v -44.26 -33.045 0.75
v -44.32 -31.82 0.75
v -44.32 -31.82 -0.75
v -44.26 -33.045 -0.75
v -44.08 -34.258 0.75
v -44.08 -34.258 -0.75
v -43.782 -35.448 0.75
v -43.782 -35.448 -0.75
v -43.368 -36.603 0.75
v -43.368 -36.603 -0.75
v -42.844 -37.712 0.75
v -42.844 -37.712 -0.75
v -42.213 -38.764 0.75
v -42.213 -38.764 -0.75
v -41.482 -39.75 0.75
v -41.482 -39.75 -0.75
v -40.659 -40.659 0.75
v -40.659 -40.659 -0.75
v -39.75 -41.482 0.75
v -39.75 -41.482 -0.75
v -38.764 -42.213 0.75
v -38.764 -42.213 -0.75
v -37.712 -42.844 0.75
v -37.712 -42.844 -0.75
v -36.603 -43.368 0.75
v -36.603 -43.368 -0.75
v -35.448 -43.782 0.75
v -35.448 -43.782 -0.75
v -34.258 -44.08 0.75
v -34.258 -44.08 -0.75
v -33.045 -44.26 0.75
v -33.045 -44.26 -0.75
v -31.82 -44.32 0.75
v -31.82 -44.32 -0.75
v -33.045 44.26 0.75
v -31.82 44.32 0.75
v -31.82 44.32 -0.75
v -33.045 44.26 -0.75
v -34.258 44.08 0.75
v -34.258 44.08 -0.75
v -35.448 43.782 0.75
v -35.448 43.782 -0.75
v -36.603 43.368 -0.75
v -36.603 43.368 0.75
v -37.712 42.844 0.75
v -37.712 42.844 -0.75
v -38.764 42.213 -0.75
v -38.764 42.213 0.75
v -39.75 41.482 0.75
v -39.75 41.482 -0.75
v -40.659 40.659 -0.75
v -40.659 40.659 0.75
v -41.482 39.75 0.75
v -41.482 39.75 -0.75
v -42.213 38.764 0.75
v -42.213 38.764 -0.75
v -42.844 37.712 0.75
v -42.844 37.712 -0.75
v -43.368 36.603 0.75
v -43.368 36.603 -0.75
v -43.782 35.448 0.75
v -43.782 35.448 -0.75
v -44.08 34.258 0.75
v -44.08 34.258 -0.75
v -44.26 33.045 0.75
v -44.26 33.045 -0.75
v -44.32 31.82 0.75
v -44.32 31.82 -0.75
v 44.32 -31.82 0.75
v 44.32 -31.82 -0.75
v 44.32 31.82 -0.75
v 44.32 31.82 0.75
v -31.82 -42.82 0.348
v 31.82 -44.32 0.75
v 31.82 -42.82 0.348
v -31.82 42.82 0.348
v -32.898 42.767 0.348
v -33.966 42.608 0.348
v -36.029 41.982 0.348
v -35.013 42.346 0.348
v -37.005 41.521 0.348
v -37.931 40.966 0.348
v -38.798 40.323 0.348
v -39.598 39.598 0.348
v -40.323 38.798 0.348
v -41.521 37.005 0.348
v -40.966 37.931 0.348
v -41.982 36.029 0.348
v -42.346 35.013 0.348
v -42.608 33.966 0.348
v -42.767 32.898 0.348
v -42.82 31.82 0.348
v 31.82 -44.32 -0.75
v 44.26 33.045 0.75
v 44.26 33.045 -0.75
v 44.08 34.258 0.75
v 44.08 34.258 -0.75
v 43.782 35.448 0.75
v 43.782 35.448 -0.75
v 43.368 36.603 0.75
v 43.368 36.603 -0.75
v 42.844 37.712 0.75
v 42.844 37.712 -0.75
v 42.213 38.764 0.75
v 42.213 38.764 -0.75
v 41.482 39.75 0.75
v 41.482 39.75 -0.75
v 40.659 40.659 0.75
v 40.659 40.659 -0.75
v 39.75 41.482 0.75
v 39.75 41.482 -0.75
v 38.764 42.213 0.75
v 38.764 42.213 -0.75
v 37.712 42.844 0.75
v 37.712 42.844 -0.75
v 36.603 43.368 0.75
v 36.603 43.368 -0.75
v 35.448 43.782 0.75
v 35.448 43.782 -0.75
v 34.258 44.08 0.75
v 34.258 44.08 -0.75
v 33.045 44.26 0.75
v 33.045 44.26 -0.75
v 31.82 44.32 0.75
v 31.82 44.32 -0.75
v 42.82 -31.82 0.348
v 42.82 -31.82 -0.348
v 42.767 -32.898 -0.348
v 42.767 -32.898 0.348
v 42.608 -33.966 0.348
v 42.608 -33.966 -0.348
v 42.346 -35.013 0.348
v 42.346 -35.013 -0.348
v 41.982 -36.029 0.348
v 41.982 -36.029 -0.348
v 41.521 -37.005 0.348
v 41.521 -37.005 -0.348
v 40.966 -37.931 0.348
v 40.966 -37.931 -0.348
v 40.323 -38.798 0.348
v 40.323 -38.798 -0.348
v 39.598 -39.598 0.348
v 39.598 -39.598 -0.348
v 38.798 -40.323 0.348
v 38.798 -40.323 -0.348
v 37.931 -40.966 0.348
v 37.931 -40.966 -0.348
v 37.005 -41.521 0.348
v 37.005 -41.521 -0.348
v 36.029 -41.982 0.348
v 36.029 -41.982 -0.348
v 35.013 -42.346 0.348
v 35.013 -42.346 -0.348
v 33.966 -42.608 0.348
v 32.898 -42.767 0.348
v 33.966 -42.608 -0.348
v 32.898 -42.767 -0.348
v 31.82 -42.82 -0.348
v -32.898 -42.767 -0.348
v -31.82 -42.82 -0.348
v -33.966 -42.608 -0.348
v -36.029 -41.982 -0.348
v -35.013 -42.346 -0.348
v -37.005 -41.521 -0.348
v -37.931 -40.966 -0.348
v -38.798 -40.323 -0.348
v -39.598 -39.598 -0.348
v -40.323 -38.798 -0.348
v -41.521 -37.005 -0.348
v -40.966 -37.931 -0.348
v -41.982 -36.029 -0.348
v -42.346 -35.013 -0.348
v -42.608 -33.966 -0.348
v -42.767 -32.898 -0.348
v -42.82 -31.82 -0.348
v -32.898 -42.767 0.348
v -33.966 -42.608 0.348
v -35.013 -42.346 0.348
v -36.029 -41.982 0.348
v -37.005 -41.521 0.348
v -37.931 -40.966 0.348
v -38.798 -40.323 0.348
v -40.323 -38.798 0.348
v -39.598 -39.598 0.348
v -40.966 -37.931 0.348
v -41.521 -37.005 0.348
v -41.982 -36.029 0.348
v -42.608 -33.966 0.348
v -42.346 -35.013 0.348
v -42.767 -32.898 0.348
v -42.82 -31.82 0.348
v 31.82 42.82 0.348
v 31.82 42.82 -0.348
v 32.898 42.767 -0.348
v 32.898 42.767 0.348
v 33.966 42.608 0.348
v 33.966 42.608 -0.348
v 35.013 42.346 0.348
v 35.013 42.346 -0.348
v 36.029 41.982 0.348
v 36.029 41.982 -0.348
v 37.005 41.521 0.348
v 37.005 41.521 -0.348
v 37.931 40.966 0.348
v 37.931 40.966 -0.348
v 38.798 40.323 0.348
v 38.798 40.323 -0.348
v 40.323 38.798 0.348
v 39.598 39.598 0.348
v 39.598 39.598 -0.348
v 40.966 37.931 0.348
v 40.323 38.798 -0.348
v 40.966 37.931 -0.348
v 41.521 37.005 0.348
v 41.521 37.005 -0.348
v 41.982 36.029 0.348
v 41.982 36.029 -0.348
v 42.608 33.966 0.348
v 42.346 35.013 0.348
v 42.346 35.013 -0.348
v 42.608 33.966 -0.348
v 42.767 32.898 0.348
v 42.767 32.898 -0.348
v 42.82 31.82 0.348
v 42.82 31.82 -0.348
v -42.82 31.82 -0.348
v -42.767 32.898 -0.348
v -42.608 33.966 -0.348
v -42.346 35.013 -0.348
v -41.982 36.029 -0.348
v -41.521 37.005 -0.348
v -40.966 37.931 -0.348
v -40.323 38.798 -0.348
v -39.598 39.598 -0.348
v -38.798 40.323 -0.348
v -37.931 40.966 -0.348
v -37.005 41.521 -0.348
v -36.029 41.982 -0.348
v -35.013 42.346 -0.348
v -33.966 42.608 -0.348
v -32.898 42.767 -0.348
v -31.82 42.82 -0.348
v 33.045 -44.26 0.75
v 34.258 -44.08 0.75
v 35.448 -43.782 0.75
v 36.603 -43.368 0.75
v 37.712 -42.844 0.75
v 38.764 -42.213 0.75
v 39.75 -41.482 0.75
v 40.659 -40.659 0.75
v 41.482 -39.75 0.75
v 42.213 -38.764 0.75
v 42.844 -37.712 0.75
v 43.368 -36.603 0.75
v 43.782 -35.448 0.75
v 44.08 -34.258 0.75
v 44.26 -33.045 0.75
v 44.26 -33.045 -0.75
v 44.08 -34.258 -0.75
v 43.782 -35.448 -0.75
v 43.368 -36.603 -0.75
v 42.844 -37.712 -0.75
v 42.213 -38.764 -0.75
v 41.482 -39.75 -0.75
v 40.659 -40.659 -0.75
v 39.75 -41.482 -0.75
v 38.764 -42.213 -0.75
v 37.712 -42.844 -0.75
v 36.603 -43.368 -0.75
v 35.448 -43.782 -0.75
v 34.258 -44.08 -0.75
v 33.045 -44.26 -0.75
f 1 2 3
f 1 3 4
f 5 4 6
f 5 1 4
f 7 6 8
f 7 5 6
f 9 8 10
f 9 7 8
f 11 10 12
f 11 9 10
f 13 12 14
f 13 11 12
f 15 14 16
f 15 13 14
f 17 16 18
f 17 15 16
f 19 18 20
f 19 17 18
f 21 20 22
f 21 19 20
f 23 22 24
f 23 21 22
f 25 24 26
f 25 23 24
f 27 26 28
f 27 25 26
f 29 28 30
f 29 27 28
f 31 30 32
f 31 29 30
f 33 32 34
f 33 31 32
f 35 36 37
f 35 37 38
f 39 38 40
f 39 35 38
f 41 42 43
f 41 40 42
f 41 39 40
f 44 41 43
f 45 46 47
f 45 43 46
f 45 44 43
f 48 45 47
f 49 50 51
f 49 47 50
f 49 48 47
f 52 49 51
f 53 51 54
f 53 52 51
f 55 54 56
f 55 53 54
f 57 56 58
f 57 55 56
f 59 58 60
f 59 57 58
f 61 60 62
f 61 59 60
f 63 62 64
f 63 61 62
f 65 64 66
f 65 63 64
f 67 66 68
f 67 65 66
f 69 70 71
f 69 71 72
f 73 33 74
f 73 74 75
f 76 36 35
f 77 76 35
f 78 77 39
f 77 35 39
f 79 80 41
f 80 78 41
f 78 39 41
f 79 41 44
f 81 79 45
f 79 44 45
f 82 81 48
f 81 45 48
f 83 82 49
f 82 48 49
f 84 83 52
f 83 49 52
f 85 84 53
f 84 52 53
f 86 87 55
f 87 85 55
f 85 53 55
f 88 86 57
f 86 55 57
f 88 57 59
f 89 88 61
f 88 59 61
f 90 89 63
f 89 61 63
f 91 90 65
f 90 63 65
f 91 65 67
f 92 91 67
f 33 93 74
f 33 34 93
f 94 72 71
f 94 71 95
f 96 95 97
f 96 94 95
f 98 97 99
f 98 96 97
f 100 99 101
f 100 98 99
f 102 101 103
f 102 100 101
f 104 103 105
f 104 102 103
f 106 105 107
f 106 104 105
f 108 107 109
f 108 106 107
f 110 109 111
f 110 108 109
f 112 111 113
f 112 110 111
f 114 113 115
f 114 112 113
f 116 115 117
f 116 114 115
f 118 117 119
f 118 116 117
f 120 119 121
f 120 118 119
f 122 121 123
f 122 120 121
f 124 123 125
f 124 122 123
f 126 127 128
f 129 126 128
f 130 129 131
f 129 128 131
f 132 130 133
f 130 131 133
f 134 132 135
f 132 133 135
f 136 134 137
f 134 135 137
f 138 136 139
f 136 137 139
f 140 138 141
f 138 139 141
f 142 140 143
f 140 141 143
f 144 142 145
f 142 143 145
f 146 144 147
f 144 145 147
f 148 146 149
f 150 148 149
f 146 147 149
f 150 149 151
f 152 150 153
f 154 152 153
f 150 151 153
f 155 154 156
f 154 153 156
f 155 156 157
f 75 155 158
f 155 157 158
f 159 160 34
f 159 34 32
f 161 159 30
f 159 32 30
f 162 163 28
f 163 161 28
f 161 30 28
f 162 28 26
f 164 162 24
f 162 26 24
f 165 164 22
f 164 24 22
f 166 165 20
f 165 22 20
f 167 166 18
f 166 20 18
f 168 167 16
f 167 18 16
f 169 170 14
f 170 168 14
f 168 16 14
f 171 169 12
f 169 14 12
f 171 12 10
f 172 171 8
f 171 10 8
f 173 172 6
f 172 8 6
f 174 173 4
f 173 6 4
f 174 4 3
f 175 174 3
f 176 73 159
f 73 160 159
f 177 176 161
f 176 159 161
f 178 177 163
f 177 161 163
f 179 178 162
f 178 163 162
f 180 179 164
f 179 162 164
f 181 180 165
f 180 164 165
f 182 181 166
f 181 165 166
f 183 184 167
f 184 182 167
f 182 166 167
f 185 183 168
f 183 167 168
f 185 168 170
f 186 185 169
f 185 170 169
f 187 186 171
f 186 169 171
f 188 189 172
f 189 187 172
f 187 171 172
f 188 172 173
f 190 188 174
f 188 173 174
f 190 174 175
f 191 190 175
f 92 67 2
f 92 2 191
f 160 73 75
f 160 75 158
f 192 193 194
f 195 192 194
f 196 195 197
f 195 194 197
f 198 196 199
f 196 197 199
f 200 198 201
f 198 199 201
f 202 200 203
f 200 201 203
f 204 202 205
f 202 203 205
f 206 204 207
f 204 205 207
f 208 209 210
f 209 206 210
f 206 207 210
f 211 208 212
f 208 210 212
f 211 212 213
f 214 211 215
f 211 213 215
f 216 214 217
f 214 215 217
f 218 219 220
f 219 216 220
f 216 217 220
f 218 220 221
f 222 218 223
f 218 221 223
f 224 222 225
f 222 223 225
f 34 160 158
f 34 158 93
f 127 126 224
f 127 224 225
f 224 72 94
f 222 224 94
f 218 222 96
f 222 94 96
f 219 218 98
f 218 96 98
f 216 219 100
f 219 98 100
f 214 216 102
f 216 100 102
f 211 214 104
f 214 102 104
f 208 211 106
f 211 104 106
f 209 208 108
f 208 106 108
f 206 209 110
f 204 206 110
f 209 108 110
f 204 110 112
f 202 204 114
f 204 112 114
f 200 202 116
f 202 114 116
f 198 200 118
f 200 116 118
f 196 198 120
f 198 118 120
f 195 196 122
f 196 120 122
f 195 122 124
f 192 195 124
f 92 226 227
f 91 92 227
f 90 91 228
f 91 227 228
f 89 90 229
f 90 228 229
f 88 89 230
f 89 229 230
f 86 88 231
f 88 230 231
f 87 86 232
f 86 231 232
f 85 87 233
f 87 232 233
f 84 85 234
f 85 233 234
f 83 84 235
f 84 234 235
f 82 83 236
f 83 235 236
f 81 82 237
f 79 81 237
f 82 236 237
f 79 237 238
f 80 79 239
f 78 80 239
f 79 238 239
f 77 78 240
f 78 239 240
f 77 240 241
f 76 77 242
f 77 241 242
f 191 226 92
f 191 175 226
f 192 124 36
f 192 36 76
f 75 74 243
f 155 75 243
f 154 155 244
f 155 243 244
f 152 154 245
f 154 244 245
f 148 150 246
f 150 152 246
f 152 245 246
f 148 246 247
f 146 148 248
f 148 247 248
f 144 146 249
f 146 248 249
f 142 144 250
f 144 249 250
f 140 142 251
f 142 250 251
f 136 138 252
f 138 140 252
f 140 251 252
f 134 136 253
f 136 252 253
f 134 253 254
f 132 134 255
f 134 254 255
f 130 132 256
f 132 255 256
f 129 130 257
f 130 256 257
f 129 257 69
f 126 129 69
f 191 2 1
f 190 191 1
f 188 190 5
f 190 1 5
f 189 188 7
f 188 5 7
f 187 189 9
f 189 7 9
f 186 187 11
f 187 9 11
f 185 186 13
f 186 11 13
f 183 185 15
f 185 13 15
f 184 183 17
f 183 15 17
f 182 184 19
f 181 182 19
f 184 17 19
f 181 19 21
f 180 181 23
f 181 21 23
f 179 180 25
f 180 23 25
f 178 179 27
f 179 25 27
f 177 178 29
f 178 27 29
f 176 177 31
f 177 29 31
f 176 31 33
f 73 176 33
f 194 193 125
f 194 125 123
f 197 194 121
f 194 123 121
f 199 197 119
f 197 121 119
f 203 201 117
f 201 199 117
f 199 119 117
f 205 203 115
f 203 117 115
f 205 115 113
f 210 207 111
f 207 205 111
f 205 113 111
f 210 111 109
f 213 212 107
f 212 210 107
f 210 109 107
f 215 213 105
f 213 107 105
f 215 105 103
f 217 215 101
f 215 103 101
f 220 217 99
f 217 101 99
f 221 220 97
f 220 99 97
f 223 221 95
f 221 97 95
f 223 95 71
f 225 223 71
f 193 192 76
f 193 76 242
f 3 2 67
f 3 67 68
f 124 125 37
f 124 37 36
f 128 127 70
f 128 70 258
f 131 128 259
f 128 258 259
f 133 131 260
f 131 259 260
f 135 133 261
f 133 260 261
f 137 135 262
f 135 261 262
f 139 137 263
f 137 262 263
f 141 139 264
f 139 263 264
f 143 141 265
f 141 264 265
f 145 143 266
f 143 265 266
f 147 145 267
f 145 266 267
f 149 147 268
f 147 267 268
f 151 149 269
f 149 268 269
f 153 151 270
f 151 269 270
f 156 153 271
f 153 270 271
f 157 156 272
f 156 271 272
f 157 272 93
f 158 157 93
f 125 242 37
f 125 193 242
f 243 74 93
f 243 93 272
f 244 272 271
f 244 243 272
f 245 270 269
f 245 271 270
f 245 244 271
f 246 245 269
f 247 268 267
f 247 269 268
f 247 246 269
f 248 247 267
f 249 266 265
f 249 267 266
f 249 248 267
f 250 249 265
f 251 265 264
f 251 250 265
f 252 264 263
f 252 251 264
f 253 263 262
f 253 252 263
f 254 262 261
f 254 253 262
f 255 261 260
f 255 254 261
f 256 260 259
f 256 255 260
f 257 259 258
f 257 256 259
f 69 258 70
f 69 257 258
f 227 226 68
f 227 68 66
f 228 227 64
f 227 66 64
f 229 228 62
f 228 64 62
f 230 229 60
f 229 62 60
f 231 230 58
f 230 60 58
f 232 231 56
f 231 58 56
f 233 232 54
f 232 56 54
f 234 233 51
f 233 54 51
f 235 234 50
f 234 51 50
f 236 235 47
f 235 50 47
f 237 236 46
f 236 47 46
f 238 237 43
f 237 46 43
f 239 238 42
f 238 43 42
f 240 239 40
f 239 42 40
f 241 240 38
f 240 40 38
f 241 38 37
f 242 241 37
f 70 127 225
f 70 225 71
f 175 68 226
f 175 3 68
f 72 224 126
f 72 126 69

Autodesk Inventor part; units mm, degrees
ref_plane "YZ Plane" through (0, 0, 0) normal (1, 0, 0) x (0, 1, 0)
ref_plane "XZ Plane" through (0, 0, 0) normal (0, 1, 0) x (-1, 0, 0)
ref_plane "XY Plane" through (0, 0, 0) normal (0, 0, 1) x (1, 0, 0)
sketch "Sketch1" plane through (0, 0, 0) normal (0, 0, 1) x (1, 0, 0)
  line L0 (0, 0) -> (0, 7.5) construction
  line L1 (10, 0) -> (0, 0) construction
  line L2 (0, 0) -> (-10, 0) construction
  line L3 (0, 0) -> (-31.8198, 31.8198) construction
  circle A0 centre (0, 0) radius 45 construction
  line L4 (0, 0) -> (0, 45) construction
  line L5 (-31.8198, 31.8198) -> (-31.8198, -24.2384) construction
  line L6 (-31.8198, -24.2384) -> (-31.8198, -31.8198) construction
  line L7 (-31.8198, 31.8198) -> (24.2384, 31.8198) construction
  line L8 (24.2384, 31.8198) -> (31.8198, 31.8198) construction
  line L9 (31.8198, 31.8198) -> (31.8198, -31.8198) construction
  line L10 (31.8198, -31.8198) -> (-31.8198, -31.8198) construction
  line L11 (0, 0) -> (39.9999, 0) construction
  line L12 (0, 0) -> (0, -40) construction
  line L13 (-31.8198, 44.3198) -> (0, 44.3198)
  line L14 (-44.3198, 31.8198) -> (-44.3198, 0)
  line L15 (-44.3198, 0) -> (0, 0) construction
  arc A1 (-31.8198, 44.3198) -> (-44.3198, 31.8198) centre (-31.8198, 31.8198) ccw
  point P0 (0, 50)
  dimension "d6" = 90
  dimension "d7" = 45
  dimension "d15" = 12.5
sketch "Sketch2" plane through (0, 0, 0) normal (1, 0, 0) x (0, 1, 0)
  line L0 (44.3198, 0) -> (44.3198, 0.75)
  line L1 (44.3198, 0.75) -> (42.8198, 0.3481)
  line L2 (42.8198, 0.3481) -> (42.8198, 0)
  line L3 (44.3198, 0) -> (42.8198, 0) construction
  line L4 (44.3198, 0) -> (44.3198, -0.75)
  line L5 (44.3198, -0.75) -> (42.8198, -0.3481)
  line L6 (42.8198, -0.3481) -> (42.8198, 0)
  dimension "d16" = 0.75
  dimension "d17" = 15
  dimension "d18" = 1.5
sweep "Sweep1" add profiles "Sketch2" path "Sketch1"
mirror "Mirror1" about plane through (0, 43.6835, 0) normal (1, 0, 0) of "Sweep1"
mirror "Mirror2" about plane through (-44.3198, 0, 0) normal (0, -1, 0) of "Sweep1", "Mirror1"
properties part number "Belt"
